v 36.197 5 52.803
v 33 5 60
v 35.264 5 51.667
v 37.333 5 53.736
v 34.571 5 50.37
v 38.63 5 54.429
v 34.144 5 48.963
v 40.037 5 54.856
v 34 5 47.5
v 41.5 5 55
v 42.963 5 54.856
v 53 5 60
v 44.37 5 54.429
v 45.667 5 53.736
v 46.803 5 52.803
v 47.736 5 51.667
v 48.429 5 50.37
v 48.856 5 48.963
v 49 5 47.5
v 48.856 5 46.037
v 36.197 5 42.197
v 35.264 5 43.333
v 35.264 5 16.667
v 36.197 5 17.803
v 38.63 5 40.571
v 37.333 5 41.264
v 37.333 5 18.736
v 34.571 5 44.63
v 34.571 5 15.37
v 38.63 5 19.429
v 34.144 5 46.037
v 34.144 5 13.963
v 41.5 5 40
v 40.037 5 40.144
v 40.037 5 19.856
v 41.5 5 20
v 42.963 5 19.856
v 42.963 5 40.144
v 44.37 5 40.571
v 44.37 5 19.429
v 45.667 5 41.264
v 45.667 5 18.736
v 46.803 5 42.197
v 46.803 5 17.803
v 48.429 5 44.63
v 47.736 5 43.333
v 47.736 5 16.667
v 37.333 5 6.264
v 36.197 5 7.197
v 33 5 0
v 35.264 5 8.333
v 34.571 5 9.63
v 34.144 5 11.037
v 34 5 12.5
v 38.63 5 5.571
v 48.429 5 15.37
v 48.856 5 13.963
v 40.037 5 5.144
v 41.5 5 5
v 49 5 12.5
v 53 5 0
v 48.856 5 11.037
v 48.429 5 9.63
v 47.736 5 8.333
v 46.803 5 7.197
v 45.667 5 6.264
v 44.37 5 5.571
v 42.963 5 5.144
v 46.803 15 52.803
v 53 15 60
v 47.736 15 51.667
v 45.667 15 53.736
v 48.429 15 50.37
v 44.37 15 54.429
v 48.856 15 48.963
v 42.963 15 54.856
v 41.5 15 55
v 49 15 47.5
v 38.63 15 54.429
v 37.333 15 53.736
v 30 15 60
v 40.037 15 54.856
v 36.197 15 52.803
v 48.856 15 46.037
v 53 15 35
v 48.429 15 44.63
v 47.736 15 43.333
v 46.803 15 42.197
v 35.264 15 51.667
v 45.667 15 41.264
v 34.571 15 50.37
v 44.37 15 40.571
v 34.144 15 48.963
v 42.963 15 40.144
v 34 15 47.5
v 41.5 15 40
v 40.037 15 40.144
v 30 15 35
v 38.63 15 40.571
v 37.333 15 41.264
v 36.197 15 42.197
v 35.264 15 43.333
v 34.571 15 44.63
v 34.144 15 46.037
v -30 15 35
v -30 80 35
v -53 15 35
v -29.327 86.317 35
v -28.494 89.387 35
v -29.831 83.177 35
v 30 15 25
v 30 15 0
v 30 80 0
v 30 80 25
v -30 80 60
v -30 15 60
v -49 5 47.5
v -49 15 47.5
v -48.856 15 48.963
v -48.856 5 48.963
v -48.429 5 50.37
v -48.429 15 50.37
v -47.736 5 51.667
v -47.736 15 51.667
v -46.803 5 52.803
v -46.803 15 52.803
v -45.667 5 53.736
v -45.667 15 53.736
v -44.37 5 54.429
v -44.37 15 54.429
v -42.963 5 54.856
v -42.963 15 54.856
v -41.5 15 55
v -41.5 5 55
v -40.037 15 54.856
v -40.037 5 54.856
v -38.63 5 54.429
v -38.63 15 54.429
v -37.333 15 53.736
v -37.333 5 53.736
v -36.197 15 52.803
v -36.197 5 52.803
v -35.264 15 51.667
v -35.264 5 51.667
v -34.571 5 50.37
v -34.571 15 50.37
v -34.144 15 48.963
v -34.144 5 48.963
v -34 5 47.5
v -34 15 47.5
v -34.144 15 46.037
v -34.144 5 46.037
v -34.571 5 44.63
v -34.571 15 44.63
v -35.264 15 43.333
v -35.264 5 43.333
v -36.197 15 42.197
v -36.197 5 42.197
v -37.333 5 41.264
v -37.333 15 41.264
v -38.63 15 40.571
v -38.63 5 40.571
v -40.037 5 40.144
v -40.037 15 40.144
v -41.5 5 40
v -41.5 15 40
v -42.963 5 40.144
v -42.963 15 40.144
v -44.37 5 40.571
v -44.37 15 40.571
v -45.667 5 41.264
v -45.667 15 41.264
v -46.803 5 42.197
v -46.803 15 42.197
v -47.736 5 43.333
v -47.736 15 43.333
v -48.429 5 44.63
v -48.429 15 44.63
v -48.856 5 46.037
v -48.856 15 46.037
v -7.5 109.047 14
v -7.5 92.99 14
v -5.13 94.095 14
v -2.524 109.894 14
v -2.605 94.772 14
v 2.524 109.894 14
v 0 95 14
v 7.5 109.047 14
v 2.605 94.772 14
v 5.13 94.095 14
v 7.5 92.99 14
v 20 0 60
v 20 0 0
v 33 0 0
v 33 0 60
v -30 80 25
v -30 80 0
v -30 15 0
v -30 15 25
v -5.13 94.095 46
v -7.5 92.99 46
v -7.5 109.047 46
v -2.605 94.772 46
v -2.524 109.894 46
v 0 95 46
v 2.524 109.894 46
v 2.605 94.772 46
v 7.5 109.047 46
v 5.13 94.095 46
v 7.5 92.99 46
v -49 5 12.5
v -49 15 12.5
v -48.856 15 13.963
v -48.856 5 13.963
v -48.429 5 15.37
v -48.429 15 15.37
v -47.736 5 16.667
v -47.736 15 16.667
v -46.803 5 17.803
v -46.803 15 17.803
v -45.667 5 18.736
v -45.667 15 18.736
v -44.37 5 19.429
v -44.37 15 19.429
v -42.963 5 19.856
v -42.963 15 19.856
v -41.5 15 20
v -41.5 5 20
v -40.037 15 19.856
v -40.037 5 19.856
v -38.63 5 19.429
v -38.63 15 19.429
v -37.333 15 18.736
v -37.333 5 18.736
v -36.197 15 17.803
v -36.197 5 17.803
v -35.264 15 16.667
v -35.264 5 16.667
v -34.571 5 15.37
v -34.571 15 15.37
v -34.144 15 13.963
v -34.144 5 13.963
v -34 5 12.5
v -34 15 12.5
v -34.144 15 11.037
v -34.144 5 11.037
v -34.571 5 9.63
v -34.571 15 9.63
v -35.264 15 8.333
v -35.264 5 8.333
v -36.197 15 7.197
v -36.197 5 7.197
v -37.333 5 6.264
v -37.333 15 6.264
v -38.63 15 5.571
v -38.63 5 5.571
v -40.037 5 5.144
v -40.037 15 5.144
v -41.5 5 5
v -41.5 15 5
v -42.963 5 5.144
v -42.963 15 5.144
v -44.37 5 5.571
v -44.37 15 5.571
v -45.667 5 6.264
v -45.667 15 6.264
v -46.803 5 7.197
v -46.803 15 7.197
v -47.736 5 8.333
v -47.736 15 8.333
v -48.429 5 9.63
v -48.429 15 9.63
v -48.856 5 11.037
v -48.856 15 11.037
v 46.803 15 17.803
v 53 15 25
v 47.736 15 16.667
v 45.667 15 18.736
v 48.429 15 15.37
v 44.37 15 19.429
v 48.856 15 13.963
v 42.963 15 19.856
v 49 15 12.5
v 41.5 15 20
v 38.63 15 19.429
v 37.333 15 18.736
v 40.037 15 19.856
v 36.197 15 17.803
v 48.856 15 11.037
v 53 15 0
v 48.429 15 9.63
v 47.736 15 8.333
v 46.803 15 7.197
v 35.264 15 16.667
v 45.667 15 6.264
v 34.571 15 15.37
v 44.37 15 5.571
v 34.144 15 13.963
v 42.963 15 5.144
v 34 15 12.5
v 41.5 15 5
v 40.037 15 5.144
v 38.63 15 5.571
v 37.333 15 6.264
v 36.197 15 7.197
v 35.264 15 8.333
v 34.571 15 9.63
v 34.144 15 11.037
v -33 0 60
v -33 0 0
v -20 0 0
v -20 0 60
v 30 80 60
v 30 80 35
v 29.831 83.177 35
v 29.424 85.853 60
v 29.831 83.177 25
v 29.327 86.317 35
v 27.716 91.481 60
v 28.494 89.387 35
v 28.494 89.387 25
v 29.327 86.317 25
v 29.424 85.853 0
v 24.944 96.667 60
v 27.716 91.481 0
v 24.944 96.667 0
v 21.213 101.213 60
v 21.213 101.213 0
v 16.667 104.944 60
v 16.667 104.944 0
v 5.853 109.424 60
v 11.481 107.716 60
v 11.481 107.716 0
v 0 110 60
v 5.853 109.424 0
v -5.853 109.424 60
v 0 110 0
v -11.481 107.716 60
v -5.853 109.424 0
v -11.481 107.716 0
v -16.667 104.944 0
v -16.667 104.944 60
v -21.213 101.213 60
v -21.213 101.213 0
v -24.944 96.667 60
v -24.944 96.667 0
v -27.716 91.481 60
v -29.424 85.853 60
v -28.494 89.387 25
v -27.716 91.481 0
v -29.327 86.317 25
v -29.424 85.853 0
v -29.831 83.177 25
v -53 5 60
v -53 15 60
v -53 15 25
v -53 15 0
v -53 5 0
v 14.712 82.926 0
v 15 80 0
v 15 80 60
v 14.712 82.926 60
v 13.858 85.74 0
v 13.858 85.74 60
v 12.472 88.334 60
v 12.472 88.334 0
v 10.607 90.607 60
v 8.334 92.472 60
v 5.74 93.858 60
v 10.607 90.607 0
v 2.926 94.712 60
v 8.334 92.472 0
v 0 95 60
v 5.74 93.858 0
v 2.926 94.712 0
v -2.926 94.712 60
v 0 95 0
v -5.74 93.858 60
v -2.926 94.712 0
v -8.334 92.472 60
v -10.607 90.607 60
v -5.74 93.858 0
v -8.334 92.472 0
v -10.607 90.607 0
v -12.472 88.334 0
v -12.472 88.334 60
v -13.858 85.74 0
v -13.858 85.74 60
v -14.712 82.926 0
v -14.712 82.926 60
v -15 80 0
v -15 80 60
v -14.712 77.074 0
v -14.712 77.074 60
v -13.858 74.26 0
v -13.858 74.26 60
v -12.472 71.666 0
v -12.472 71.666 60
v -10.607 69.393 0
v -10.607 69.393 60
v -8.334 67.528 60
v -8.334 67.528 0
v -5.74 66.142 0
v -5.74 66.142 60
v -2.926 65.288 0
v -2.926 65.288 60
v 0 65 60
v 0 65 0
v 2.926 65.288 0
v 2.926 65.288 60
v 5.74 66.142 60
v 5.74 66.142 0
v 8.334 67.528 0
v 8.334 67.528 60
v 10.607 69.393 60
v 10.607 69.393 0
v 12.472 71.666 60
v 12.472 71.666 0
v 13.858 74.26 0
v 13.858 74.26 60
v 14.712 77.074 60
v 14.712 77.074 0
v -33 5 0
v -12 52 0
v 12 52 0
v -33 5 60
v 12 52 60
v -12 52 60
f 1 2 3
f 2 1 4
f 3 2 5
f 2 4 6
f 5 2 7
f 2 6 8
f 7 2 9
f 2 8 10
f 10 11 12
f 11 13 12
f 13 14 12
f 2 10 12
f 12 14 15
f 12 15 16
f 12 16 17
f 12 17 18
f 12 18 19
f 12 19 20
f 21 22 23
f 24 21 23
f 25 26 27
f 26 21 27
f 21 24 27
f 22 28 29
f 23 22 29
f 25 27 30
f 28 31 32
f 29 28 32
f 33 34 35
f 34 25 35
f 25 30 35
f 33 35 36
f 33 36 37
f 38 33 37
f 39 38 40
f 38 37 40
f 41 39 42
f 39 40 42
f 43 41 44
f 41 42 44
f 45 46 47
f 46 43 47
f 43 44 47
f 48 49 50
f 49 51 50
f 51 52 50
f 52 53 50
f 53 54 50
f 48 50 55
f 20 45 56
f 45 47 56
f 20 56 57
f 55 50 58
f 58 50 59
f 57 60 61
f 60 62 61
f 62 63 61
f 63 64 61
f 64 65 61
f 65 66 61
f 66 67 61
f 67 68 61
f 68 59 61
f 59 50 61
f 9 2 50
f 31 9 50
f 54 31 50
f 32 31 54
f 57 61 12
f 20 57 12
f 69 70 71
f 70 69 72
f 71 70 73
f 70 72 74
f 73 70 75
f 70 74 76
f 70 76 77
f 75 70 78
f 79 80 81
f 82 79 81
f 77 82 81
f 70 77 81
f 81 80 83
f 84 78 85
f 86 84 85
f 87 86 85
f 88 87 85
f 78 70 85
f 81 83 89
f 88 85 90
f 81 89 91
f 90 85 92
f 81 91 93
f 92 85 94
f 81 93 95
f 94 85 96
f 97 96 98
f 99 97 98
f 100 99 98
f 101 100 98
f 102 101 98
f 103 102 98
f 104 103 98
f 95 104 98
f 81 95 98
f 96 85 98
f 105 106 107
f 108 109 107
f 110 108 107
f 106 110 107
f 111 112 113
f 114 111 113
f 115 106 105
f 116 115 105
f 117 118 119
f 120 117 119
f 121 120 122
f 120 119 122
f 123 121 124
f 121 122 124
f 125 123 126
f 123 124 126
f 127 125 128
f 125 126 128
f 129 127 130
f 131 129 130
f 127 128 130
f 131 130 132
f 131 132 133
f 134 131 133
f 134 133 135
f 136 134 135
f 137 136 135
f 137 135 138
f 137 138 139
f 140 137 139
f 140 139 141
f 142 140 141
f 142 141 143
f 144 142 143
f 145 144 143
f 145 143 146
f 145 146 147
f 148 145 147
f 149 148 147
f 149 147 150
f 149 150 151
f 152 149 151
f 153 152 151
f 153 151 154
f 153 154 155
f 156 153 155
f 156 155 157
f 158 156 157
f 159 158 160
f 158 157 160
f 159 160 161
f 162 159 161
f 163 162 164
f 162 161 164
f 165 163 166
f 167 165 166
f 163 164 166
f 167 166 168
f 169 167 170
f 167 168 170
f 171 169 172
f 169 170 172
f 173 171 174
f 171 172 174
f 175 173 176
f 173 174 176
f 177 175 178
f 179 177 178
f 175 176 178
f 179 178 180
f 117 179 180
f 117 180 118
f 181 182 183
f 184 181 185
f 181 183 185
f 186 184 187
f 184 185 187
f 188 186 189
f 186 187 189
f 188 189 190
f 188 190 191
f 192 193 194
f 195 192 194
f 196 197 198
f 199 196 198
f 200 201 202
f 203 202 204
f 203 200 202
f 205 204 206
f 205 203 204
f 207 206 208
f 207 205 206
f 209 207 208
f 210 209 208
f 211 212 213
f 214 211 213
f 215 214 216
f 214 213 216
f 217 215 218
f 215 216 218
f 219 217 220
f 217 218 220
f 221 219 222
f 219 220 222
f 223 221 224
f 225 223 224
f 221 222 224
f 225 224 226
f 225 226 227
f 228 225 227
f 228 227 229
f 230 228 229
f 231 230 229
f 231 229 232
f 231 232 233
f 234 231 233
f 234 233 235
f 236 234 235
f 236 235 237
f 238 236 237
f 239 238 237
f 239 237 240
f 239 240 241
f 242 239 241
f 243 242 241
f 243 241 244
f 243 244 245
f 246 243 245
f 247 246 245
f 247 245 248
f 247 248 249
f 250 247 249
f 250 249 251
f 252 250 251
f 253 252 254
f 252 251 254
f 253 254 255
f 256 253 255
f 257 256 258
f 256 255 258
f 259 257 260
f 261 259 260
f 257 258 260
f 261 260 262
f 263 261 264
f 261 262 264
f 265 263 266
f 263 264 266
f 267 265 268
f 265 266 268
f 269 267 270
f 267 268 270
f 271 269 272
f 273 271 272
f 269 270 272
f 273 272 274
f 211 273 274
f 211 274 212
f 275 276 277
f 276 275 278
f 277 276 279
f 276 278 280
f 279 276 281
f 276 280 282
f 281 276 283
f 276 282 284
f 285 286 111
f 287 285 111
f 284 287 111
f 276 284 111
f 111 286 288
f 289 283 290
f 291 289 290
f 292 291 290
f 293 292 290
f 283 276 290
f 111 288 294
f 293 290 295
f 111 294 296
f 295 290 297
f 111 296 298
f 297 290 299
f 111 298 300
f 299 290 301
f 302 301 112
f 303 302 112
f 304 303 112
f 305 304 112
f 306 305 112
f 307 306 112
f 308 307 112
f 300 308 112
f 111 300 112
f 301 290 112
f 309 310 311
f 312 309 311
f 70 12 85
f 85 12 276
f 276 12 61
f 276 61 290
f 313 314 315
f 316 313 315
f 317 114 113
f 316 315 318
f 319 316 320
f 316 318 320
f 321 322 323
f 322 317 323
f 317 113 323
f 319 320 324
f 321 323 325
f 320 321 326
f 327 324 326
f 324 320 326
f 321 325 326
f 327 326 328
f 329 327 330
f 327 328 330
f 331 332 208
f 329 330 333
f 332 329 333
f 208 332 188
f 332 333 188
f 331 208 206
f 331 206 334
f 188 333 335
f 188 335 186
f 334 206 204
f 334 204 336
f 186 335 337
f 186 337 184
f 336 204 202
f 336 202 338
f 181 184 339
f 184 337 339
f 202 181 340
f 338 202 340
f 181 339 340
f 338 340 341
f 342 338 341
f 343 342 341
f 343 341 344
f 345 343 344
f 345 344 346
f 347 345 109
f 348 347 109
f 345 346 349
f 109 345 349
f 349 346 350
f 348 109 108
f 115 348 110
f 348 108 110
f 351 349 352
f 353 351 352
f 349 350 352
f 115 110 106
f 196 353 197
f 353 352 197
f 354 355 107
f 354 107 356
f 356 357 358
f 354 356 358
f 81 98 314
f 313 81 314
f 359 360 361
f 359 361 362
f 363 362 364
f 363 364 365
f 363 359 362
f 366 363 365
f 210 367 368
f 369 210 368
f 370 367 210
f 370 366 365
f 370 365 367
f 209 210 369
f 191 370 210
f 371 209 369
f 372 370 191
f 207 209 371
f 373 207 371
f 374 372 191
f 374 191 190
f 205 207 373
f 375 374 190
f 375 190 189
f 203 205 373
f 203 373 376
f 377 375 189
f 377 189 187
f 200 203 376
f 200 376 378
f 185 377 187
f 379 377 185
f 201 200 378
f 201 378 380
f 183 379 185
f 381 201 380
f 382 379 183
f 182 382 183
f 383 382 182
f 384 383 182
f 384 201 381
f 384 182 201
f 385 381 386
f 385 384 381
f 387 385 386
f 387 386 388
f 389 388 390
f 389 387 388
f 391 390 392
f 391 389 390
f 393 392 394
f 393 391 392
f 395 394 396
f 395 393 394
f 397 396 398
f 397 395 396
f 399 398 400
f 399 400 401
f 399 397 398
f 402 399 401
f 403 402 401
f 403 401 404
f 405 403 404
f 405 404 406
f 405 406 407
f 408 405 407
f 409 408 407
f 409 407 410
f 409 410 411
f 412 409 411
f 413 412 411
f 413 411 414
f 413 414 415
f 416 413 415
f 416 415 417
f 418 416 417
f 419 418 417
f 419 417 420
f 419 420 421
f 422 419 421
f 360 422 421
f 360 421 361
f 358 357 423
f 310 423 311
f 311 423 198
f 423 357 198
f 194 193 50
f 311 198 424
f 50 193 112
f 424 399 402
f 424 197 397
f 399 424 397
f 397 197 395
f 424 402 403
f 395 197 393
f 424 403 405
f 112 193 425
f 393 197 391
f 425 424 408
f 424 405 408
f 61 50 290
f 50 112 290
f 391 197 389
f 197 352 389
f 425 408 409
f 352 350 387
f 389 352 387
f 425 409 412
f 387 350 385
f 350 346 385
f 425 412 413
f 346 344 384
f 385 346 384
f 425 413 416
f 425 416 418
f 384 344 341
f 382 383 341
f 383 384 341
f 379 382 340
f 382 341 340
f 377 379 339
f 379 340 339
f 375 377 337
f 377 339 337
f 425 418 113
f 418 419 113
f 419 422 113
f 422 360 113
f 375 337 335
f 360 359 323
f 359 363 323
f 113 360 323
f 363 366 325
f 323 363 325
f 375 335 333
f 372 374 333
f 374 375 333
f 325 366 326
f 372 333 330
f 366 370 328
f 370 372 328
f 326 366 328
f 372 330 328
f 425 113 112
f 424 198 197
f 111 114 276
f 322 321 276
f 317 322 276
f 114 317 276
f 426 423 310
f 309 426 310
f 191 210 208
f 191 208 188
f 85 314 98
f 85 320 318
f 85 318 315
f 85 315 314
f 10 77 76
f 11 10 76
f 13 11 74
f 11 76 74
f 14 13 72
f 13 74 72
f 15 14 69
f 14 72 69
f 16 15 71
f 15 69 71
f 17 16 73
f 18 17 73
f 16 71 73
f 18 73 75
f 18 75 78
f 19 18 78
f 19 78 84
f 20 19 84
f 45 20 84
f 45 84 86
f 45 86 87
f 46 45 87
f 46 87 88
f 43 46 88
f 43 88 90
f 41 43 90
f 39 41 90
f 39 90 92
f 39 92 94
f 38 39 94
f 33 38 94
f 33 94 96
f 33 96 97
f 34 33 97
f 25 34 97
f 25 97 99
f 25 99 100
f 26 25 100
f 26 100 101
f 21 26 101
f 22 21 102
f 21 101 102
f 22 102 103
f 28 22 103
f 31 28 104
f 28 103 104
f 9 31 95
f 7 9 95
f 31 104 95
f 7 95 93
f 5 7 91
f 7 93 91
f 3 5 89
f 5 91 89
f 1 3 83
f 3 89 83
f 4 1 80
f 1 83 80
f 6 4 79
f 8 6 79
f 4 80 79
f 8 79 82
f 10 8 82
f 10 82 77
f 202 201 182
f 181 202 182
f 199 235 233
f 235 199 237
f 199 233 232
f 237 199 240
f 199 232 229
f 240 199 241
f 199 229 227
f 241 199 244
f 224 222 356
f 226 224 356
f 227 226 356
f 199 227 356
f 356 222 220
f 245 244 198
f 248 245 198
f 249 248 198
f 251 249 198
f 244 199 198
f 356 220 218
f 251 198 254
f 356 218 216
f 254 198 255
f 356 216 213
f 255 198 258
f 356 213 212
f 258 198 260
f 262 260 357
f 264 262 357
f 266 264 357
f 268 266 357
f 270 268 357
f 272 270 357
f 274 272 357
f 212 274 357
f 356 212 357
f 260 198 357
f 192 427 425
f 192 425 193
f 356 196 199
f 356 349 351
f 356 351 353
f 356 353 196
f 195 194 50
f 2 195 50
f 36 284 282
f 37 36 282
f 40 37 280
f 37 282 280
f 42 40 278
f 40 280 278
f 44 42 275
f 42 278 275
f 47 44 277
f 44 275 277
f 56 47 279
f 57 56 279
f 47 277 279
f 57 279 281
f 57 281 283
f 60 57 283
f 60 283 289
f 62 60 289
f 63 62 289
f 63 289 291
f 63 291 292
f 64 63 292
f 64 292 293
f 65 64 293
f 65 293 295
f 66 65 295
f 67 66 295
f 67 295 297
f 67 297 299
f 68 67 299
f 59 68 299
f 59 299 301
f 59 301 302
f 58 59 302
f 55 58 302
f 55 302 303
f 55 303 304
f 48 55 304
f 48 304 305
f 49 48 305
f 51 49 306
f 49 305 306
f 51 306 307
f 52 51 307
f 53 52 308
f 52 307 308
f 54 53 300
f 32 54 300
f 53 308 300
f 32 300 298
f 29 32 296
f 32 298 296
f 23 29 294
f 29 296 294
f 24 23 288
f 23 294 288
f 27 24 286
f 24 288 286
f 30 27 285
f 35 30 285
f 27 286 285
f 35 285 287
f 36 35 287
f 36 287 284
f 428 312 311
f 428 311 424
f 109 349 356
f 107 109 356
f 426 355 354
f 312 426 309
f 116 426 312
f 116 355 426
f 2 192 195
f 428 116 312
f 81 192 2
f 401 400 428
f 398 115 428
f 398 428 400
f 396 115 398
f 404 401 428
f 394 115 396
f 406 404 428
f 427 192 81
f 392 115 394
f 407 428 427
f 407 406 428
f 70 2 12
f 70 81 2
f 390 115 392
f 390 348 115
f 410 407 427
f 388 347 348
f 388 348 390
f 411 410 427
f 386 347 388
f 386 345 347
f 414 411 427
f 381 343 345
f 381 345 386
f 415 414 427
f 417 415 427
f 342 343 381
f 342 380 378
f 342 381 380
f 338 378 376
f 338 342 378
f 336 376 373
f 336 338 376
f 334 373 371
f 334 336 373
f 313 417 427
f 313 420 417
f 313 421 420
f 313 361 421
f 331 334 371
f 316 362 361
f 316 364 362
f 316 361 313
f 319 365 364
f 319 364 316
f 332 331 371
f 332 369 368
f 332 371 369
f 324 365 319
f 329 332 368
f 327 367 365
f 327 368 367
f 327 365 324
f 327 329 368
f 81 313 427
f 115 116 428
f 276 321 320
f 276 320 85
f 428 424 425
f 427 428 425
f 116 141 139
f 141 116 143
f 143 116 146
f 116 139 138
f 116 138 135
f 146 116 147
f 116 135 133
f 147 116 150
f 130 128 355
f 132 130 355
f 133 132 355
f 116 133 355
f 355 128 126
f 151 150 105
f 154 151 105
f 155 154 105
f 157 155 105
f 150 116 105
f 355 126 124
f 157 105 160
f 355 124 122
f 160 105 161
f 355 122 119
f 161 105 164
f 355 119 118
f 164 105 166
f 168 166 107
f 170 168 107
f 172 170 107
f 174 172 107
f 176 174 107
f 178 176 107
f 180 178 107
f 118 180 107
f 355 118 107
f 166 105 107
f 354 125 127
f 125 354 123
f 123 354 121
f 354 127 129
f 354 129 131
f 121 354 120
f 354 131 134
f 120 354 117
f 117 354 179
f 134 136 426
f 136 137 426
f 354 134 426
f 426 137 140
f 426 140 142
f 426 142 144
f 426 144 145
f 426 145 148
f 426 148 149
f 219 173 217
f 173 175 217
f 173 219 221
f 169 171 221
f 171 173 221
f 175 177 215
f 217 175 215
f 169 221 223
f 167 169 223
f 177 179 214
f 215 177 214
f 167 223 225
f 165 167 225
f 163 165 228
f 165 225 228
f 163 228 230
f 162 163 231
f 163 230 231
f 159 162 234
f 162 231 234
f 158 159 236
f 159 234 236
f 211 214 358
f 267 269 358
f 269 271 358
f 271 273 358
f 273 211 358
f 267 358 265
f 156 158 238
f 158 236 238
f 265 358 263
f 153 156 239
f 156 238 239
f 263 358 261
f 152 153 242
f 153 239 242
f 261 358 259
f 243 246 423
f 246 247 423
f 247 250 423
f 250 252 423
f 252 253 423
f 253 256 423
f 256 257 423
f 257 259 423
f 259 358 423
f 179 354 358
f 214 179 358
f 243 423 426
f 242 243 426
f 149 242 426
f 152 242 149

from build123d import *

# Parameters (mm, degrees)
SKETCH1_R           = 15
BOSS_EXTRUDE1_DEPTH = 60
SKETCH2_R           = 7.5
CUT_EXTRUDE1_DEPTH  = 125.233650836
SKETCH3_W           = 15
SKETCH3_H           = 32
CUT_EXTRUDE2_DEPTH  = 114.176852757
RIB3_REACH          = 127.734
SKETCH4_WALL_W      = 331.787548758
SKETCH4_WALL_H      = 10


with BuildPart() as part:
    # Sketch1 → Boss-Extrude1 (new body)
    with BuildSketch(Plane.XY):
        with BuildLine():
            Line((-12, 52), (12, 52))
            Line((12, 52), (20, 0))
            Line((20, 0), (33, 0))
            Line((33, 0), (33, 5))
            Line((33, 5), (53, 5))
            Line((53, 5), (53, 15))
            Line((53, 15), (30, 15))
            Line((30, 15), (30, 80))
            ThreePointArc((30, 80), (0, 110), (-30, 80))
            Line((-30, 80), (-30, 15))
            Line((-30, 15), (-53, 15))
            Line((-53, 15), (-53, 5))
            Line((-53, 5), (-33, 5))
            Line((-33, 5), (-33, 0))
            Line((-33, 0), (-20, 0))
            Line((-20, 0), (-12, 52))
        make_face()
        with Locations((0, 80)):
            Circle(SKETCH1_R, mode=Mode.SUBTRACT)
    extrude(amount=BOSS_EXTRUDE1_DEPTH)

    # Sketch2 → Cut-Extrude1 (cut, through all)
    with BuildSketch(Plane(origin=(0, 15, 0), x_dir=(1, 0, 0), z_dir=(0, 1, 0))):
        with Locations(Location((-41.5, -12.5, 0), (0, 0, 180))):
            Circle(SKETCH2_R)
        with Locations(Location((-41.5, -47.5, 0), (0, 0, 180))):
            Circle(SKETCH2_R)
        with Locations(Location((41.5, -47.5, 0), (0, 0, 270))):
            Circle(SKETCH2_R)
        with Locations(Location((41.5, -12.5, 0), (0, 0, 270))):
            Circle(SKETCH2_R)
    extrude(amount=-CUT_EXTRUDE1_DEPTH, mode=Mode.SUBTRACT)

    # Sketch3 → Cut-Extrude2 (cut, through all)
    with BuildSketch(Plane(origin=(0, 80, 0), x_dir=(1, 0, 0), z_dir=(0, 1, 0))):
        with Locations((0, -30)):
            Rectangle(SKETCH3_W, SKETCH3_H)
    extrude(amount=CUT_EXTRUDE2_DEPTH, mode=Mode.SUBTRACT)

    # Sketch4 wall → Rib3 (add, up to next)
    with BuildSketch(Plane(origin=(40.746781429, 52.193529473, 30), x_dir=(0.312901964861, -0.949785428603, 0), z_dir=(0.949785428603, 0.312901964861, 0)), mode=Mode.PRIVATE) as rib3_sk1:
        Rectangle(SKETCH4_WALL_W, SKETCH4_WALL_H)
    rib3_tool1 = extrude(rib3_sk1.sketch, amount=-RIB3_REACH, mode=Mode.PRIVATE) - part.part
    rib3 = rib3_tool1.solids().sort_by_distance((40.746781429, 52.193529473, 30))[0]
    add(rib3)

    # Mirror1: Rib3 across plane
    add(rib3.mirror(Plane(origin=(0, 0, 0), x_dir=(0, 0, 1), z_dir=(1, 0, 0))))


solid = part.part
